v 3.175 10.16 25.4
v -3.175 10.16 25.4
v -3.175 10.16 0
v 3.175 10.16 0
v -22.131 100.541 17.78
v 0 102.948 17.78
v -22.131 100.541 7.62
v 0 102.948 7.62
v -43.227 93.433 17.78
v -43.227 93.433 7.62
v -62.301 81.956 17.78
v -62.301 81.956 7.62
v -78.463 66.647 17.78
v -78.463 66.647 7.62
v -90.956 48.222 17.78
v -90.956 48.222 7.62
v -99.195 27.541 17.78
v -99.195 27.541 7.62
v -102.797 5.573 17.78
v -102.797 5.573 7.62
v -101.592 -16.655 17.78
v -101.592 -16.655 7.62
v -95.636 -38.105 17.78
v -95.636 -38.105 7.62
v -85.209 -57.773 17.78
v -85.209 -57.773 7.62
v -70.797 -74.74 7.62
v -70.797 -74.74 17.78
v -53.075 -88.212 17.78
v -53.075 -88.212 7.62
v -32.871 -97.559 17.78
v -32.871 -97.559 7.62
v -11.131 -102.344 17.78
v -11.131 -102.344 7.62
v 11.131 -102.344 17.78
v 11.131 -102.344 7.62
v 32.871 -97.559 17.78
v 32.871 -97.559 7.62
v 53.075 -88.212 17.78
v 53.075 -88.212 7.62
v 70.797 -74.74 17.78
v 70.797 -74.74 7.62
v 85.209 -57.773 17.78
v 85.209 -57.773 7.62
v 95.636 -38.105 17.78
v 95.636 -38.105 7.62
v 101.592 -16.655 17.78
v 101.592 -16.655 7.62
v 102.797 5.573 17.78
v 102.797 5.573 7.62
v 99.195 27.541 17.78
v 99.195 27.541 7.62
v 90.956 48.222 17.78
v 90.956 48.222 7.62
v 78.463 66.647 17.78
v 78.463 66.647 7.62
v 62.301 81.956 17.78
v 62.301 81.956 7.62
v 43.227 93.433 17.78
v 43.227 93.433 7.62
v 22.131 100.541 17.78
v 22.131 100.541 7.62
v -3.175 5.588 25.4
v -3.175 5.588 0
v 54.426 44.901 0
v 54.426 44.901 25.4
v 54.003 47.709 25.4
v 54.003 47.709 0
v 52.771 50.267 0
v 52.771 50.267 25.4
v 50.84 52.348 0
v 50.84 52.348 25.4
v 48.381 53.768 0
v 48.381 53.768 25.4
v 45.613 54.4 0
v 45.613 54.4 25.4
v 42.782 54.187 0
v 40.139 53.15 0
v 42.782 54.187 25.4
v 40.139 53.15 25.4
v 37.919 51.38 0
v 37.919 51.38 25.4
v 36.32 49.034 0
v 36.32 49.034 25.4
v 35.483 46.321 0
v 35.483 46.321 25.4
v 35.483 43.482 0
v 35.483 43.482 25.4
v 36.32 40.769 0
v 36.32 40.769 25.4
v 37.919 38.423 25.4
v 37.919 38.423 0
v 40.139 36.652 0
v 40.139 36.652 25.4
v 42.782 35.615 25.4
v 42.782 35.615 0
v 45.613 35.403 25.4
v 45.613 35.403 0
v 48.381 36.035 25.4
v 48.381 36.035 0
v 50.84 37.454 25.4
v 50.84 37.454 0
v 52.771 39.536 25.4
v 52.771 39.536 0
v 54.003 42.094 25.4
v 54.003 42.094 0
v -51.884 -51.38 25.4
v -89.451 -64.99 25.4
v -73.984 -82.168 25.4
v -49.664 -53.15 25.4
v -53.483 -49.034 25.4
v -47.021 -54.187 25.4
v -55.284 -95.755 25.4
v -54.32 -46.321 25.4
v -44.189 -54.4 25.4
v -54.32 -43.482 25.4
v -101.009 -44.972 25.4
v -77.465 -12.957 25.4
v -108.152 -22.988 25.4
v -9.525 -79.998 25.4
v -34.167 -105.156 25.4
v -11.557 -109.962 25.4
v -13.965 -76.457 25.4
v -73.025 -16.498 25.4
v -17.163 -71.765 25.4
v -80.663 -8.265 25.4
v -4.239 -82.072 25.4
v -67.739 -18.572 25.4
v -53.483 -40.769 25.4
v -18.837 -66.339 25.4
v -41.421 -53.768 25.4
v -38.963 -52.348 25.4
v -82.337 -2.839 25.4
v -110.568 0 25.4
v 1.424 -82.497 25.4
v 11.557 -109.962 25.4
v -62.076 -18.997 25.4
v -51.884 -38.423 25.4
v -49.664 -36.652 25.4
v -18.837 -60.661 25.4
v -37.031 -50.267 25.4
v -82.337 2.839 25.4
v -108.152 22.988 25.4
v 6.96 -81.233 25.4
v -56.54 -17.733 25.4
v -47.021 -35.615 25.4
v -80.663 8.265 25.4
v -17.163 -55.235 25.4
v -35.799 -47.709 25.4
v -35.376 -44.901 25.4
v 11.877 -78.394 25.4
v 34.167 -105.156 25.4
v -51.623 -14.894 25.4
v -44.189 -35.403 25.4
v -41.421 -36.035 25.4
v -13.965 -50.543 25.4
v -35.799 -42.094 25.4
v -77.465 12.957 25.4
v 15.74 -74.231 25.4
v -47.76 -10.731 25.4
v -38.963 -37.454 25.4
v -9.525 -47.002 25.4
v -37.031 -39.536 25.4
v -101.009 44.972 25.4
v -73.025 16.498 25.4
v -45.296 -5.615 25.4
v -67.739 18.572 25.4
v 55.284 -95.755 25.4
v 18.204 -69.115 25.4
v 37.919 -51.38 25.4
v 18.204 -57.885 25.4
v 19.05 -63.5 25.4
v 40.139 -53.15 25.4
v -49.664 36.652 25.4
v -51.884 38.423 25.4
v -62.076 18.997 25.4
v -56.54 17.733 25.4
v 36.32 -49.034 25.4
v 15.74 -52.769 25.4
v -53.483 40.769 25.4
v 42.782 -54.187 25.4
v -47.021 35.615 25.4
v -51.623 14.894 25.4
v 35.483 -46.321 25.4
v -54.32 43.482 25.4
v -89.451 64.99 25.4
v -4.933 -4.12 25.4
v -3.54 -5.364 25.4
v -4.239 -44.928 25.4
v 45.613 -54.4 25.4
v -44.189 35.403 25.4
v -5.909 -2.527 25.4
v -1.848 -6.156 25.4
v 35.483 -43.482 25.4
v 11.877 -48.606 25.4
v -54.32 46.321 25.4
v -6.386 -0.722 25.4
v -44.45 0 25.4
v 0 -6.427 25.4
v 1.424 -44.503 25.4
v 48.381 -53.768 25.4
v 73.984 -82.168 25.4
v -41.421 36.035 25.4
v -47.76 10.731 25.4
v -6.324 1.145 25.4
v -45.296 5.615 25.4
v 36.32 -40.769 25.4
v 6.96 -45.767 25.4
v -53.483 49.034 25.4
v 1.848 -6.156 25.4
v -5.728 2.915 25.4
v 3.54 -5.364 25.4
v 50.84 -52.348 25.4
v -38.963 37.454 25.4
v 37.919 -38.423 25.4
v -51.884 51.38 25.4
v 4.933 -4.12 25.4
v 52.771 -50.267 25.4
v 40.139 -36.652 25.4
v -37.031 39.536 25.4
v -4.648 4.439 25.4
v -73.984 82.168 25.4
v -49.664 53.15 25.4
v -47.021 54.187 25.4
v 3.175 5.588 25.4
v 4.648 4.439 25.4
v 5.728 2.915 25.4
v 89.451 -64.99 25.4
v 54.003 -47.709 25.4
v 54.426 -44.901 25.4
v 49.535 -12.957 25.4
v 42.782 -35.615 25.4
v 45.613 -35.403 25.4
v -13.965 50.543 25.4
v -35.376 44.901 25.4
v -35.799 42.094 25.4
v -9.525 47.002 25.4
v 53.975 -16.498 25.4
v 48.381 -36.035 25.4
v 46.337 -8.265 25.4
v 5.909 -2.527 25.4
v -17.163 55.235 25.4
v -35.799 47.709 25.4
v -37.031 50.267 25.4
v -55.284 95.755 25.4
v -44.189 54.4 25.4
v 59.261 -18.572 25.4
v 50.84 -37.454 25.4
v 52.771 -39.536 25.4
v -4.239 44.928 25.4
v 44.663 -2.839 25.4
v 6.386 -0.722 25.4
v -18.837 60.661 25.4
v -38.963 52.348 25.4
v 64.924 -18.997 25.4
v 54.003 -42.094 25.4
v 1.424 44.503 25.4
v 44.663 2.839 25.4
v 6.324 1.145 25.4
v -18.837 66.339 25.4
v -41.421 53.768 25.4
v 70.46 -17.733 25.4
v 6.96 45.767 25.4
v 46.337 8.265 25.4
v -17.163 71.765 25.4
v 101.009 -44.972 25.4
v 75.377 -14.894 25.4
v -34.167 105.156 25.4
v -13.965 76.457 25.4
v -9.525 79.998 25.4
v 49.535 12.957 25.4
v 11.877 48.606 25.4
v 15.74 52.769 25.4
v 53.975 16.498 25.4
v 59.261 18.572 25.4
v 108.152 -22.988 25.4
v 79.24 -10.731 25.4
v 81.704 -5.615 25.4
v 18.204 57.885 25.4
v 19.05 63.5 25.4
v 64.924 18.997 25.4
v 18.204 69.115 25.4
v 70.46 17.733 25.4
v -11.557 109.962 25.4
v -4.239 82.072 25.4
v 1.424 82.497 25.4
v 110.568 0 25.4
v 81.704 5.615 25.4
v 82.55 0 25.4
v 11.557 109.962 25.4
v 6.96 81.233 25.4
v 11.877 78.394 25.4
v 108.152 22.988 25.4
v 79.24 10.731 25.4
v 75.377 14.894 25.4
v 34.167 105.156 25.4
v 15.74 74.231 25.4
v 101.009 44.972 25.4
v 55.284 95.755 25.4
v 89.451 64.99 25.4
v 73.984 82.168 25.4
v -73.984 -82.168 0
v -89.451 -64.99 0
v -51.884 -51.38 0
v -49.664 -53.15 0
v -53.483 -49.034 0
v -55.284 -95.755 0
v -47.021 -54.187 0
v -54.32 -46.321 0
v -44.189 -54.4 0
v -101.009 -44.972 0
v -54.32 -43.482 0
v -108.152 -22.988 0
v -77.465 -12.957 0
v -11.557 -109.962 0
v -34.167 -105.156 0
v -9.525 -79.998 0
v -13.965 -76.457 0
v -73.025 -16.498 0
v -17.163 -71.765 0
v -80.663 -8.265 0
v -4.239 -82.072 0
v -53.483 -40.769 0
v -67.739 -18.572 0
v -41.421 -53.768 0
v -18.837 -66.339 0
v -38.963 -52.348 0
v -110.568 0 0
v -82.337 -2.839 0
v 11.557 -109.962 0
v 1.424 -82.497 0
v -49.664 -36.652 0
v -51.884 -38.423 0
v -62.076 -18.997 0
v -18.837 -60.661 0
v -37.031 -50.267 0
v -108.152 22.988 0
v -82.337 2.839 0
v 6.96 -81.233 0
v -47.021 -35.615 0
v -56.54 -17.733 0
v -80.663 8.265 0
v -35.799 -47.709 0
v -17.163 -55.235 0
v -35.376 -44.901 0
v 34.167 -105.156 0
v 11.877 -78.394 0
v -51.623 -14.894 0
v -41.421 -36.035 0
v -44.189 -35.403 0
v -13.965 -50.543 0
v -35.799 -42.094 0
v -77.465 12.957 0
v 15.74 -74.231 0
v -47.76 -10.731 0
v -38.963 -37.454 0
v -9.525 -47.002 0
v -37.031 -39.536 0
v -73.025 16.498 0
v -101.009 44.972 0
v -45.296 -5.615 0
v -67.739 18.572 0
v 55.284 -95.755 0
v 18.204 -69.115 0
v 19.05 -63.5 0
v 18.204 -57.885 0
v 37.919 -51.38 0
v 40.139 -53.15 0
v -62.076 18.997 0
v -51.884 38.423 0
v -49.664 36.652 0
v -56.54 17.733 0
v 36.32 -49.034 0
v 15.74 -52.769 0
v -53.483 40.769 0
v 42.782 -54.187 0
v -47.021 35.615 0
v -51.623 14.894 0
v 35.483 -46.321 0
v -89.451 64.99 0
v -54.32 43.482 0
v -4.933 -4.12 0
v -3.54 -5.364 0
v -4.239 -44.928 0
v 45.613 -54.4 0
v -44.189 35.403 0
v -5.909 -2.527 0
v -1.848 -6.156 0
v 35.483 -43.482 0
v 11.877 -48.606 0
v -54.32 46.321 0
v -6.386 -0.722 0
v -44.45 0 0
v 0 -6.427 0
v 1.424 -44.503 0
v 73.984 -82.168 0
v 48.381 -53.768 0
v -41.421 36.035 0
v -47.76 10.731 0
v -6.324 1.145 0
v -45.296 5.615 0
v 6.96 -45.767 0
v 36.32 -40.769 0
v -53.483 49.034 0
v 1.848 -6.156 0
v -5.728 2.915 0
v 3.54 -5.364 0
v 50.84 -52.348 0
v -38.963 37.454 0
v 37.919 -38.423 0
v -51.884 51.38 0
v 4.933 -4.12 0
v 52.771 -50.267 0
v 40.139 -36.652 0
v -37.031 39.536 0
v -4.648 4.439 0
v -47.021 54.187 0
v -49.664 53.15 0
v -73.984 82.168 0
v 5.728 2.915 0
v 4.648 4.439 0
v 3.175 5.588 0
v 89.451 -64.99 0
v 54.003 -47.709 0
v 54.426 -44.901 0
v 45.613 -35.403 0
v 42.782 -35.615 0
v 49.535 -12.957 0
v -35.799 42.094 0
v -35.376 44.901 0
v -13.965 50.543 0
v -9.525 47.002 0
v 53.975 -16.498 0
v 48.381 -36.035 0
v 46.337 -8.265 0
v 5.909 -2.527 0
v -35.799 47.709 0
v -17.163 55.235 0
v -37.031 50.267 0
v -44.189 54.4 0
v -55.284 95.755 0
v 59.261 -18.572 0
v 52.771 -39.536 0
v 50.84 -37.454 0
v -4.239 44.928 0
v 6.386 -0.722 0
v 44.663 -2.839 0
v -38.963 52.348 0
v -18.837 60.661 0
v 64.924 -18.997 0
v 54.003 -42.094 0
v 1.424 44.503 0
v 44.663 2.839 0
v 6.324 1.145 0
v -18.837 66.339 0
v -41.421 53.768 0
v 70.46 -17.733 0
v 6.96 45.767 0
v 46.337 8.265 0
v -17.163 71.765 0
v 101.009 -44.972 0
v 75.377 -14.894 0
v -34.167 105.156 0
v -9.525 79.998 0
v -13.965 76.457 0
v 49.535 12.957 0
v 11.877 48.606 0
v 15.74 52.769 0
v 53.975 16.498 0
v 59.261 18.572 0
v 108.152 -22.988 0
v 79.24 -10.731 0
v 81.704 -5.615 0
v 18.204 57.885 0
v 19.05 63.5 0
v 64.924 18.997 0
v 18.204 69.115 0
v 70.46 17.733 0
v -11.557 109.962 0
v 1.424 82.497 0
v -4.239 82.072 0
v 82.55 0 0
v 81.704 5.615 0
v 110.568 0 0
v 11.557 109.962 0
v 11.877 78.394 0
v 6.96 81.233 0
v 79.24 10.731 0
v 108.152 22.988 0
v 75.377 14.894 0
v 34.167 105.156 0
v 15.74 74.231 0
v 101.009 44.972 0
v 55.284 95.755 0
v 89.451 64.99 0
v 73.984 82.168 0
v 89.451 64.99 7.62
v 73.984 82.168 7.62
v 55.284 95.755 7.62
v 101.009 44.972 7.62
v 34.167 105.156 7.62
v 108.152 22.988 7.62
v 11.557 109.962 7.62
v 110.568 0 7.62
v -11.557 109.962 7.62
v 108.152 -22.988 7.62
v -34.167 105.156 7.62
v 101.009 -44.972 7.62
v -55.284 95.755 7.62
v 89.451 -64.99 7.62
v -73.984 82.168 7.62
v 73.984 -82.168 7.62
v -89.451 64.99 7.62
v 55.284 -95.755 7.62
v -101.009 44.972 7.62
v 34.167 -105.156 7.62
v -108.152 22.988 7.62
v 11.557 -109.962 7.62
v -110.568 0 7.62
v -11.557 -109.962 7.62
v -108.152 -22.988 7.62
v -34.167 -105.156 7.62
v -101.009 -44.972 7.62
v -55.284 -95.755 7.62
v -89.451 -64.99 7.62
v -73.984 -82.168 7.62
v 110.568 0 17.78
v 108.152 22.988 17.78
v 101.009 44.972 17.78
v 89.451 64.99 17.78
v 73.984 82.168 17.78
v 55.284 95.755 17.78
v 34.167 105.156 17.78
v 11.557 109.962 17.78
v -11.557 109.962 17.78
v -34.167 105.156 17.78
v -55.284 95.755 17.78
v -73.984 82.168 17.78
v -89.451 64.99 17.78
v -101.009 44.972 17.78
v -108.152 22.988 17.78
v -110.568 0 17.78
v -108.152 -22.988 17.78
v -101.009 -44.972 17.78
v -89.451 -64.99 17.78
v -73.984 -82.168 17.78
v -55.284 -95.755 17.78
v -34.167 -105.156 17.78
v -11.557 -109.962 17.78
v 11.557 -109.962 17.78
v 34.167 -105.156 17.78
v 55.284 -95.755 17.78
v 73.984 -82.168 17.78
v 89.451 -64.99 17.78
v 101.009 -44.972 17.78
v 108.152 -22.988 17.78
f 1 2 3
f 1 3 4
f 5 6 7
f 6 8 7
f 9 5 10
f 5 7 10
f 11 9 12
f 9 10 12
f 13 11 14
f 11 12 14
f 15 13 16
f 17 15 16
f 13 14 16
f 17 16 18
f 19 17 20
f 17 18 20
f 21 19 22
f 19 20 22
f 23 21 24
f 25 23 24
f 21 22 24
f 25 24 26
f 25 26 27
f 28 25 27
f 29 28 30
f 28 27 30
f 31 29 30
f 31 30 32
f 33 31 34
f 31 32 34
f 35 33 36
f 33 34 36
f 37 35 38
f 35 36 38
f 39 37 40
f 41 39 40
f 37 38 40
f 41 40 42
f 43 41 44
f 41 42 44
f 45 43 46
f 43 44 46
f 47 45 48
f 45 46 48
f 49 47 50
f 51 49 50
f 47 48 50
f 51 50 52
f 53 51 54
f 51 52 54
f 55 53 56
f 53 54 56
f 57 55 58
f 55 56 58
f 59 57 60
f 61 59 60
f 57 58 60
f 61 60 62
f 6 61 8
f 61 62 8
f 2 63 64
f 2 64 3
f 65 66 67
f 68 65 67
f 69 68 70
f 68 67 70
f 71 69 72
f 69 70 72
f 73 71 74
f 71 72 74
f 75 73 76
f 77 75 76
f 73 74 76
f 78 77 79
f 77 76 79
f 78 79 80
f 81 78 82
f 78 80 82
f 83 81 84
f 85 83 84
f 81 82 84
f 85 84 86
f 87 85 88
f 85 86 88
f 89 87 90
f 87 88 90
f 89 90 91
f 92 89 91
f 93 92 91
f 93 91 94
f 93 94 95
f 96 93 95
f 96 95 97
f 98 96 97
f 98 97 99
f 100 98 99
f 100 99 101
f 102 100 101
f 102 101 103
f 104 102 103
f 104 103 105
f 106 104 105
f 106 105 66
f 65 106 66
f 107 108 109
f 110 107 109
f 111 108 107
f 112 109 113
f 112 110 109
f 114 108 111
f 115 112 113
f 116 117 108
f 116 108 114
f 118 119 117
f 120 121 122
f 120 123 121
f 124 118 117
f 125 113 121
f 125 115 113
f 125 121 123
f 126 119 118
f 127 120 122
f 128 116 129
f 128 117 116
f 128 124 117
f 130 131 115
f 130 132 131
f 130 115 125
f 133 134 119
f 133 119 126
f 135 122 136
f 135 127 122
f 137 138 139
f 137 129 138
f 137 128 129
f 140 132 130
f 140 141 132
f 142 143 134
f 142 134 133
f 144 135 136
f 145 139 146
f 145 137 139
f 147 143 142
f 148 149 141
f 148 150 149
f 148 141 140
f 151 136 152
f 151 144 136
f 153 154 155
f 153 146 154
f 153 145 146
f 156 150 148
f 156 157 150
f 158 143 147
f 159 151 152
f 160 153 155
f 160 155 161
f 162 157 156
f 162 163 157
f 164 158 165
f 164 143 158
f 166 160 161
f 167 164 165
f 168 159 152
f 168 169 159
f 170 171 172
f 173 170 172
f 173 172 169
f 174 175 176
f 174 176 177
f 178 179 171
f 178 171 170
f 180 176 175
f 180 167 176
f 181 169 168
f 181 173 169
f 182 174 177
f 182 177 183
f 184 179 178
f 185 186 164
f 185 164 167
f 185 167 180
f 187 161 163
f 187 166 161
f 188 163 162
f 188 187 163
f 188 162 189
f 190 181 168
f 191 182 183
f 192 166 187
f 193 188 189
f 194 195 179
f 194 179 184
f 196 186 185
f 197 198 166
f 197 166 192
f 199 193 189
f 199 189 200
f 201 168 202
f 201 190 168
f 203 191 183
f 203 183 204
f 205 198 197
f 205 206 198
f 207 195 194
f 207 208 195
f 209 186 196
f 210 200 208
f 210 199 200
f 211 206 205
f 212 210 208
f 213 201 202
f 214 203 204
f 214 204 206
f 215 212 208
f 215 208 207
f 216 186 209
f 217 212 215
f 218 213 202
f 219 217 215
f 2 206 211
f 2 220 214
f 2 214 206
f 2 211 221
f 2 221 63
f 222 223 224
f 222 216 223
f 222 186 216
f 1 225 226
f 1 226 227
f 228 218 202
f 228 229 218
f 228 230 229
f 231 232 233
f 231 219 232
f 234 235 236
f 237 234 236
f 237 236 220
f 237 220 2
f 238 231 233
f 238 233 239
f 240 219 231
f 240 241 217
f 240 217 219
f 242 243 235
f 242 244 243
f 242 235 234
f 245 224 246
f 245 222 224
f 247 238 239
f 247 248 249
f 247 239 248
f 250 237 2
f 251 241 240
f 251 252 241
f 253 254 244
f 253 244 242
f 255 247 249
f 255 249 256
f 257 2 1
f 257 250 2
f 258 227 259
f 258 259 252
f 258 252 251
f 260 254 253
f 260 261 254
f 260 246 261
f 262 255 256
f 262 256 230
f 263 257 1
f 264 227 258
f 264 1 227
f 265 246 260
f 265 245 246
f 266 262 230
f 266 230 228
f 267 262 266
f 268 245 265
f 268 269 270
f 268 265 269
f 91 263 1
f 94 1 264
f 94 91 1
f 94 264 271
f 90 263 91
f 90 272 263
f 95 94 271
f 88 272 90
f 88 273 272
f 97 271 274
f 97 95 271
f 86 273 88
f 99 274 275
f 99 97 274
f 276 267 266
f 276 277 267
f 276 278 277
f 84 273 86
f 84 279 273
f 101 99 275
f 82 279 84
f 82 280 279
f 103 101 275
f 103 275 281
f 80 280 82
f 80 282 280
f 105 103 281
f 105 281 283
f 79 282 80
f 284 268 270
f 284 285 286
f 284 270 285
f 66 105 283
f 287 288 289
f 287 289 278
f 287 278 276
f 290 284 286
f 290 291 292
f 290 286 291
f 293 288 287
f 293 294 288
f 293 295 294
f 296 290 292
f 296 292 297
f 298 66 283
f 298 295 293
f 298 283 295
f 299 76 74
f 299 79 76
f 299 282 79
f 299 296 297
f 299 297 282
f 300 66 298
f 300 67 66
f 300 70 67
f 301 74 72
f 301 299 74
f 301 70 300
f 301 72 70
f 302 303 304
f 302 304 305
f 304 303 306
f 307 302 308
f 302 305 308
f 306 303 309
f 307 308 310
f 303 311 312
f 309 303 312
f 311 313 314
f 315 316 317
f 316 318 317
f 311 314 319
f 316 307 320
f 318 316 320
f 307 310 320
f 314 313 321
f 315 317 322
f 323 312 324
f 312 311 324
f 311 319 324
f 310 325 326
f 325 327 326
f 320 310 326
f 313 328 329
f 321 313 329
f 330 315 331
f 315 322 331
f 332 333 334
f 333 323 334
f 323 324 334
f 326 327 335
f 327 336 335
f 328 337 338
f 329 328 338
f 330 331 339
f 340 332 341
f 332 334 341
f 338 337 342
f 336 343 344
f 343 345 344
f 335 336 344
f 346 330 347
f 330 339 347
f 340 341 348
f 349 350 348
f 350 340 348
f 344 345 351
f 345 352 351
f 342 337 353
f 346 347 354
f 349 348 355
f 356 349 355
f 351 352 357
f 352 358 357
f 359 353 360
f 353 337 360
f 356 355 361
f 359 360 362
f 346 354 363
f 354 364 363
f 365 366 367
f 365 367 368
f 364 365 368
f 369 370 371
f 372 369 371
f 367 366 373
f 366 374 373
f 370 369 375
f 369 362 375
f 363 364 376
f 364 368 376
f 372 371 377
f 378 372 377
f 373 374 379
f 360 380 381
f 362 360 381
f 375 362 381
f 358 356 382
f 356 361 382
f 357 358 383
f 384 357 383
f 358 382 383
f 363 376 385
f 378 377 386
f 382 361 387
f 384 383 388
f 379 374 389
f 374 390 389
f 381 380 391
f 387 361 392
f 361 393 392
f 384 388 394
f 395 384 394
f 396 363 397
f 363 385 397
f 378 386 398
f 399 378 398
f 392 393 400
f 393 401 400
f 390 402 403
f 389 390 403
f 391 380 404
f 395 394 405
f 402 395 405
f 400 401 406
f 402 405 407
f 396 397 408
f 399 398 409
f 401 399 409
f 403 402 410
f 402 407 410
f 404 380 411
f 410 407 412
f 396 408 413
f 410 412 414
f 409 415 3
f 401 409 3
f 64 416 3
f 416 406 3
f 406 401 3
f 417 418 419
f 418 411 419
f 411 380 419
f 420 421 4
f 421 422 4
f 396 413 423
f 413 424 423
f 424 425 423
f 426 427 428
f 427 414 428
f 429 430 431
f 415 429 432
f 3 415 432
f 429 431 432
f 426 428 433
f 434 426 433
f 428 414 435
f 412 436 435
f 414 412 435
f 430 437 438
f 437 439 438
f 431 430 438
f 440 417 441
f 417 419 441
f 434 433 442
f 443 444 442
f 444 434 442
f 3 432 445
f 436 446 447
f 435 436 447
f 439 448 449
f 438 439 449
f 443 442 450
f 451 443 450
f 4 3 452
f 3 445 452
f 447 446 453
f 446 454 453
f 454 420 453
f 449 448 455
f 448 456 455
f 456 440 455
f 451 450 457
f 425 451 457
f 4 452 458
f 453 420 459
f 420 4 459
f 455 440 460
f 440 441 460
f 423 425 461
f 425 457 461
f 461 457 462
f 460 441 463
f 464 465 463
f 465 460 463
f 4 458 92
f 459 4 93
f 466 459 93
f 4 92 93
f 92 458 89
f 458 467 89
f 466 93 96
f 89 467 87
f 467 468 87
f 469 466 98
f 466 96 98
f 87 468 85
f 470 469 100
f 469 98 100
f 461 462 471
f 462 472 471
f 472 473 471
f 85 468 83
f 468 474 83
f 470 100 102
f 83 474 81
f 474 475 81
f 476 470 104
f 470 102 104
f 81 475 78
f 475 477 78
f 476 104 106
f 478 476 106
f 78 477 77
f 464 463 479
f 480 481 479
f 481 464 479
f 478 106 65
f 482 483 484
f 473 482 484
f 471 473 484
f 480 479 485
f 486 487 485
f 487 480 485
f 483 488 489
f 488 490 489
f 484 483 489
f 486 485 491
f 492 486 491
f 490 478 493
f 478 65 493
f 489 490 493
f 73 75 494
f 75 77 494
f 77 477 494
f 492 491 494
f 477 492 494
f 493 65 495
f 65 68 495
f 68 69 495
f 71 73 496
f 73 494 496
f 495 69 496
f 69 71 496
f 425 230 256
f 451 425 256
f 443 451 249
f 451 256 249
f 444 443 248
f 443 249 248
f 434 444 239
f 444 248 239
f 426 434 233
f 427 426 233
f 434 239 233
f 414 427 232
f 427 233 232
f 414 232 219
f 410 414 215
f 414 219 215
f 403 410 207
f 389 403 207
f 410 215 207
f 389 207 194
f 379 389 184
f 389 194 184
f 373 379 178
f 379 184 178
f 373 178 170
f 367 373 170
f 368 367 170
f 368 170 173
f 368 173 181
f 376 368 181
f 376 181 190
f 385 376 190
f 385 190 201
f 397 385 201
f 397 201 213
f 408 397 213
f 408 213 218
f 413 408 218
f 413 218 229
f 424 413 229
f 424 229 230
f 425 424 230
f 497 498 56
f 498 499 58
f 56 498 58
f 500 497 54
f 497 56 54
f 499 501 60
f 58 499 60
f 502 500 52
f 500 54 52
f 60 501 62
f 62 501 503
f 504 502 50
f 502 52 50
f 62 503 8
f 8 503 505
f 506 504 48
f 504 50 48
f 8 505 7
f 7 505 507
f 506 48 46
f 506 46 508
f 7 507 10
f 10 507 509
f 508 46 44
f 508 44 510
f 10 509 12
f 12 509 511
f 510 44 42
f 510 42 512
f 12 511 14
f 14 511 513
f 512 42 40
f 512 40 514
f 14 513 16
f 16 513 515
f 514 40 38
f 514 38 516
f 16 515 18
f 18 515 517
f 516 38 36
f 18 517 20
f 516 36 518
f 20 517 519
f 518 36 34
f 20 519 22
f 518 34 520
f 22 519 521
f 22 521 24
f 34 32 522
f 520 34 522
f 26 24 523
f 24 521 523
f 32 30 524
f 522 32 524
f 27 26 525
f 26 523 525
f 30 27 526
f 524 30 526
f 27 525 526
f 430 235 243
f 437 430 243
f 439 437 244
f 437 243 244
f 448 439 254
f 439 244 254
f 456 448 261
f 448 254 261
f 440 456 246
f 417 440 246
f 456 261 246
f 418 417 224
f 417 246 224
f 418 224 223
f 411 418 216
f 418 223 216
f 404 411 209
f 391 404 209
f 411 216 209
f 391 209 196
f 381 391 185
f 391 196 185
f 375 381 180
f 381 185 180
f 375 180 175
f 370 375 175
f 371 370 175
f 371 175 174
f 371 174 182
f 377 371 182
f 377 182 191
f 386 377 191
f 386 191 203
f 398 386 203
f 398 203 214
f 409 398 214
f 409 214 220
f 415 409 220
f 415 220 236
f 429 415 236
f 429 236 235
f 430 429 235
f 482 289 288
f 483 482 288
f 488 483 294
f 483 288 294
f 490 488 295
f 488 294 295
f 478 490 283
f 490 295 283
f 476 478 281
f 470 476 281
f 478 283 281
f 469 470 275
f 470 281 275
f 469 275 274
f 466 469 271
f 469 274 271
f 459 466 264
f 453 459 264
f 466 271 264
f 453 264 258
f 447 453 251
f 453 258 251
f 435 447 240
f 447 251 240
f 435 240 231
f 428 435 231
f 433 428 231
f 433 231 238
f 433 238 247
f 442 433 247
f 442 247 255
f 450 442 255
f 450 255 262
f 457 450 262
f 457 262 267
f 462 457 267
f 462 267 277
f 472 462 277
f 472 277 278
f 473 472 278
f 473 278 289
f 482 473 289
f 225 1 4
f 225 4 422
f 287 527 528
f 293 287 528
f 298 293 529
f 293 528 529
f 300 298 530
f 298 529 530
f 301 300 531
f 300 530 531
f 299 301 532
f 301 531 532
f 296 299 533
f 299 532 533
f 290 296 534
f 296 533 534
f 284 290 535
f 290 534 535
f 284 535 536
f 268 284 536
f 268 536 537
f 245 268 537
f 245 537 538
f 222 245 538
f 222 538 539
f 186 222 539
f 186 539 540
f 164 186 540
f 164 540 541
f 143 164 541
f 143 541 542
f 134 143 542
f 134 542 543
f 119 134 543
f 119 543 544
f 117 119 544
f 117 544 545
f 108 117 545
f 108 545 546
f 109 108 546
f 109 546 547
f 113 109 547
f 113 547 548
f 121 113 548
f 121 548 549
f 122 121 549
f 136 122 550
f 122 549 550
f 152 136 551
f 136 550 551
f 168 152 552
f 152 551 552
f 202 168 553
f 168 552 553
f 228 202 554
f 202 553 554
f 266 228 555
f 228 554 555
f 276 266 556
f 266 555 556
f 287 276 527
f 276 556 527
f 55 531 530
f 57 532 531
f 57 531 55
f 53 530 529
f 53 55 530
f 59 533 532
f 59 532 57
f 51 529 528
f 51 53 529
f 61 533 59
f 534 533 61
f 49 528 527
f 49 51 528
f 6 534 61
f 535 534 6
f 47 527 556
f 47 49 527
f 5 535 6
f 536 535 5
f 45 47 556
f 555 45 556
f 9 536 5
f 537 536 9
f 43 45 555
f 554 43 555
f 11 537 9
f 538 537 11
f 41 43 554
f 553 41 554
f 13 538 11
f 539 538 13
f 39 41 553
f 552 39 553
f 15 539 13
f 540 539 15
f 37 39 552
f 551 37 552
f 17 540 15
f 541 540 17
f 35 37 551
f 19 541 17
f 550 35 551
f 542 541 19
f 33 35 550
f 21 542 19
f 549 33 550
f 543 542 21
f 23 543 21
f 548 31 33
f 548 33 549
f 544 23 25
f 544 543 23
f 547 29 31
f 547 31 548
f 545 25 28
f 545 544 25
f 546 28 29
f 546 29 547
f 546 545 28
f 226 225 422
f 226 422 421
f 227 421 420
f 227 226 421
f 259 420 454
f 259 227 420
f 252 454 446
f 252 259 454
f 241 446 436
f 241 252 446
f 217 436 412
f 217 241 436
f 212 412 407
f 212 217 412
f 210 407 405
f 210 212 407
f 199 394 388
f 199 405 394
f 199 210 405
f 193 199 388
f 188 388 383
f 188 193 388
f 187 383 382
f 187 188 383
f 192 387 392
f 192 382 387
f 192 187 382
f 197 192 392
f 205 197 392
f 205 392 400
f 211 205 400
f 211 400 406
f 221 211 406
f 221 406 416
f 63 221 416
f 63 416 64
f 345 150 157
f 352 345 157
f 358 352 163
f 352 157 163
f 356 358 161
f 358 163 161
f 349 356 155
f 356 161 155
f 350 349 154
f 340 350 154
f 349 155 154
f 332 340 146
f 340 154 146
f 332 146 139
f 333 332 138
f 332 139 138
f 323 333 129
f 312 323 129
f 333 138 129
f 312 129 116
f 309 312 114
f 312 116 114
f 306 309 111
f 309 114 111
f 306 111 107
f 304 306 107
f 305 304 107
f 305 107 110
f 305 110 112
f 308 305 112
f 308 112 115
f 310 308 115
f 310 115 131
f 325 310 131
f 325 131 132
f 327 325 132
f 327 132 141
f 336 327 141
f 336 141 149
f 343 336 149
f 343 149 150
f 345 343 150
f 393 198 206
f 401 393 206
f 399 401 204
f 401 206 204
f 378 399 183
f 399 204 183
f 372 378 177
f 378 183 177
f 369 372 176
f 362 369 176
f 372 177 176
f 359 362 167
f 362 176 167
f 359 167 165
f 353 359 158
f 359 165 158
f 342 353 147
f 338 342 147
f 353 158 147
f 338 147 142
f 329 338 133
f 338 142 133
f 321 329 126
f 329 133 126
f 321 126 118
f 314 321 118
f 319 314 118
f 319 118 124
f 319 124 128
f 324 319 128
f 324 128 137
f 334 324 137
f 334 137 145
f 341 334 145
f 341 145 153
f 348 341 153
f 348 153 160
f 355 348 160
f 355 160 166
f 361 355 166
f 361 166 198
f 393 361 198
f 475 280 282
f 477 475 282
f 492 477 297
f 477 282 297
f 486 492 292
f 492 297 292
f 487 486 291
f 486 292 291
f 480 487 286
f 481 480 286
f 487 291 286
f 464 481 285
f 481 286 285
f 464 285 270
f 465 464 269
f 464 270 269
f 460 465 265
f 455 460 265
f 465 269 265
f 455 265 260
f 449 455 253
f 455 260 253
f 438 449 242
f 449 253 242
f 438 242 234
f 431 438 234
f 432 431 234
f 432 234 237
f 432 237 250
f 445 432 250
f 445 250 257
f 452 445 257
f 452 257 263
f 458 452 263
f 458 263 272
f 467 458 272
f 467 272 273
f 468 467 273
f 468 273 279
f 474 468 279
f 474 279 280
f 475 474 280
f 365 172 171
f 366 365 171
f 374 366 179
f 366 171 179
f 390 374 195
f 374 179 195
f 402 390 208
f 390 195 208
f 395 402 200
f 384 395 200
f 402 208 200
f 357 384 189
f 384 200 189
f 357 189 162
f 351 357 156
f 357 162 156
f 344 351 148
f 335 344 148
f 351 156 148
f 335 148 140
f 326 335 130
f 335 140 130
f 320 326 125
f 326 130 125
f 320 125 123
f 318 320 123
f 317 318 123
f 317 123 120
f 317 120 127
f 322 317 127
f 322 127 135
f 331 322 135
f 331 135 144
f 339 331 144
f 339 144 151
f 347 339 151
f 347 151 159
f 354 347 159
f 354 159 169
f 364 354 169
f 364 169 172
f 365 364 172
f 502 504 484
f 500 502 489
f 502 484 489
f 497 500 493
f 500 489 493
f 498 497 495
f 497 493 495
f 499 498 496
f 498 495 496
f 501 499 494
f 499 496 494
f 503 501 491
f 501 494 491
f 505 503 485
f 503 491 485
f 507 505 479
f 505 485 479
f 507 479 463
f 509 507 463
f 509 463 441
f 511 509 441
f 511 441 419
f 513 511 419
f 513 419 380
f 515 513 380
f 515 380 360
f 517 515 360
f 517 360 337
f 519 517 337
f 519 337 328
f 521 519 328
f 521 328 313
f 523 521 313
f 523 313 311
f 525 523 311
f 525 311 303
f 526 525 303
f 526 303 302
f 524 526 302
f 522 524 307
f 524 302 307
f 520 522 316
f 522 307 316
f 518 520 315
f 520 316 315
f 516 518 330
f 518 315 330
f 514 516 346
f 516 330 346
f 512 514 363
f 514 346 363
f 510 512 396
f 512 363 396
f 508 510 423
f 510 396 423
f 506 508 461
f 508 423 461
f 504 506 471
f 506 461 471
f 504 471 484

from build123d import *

# Parameters (mm, degrees)
SKETCH1_R           = 110.567781149
BOSS_EXTRUDE1_DEPTH = 25.4
SKETCH2_R           = 19.05
SKETCH2_R_2         = 9.525
CUT_EXTRUDE3_DEPTH  = 140.716
CUT_EXTRUDE4_DEPTH  = 134.112
SKETCH6_W           = 10.16
SKETCH6_H           = 7.62


with BuildPart() as part:
    # Sketch1 → Boss-Extrude1 (new body)
    with BuildSketch(Plane.XY):
        Circle(SKETCH1_R)
    extrude(amount=BOSS_EXTRUDE1_DEPTH)

    # Sketch2 → Cut-Extrude3 (cut)
    with BuildSketch(Plane.XY.offset(25.4)):
        with Locations((0, 63.5)):
            Circle(SKETCH2_R)
        with Locations((63.5, 0)):
            Circle(SKETCH2_R)
        with Locations((44.901280605, -44.901280605)):
            Circle(SKETCH2_R_2)
        with Locations((0, -63.5)):
            Circle(SKETCH2_R)
        with Locations((44.901280605, 44.901280605)):
            Circle(SKETCH2_R_2)
        with Locations((-44.901280605, -44.901280605)):
            Circle(SKETCH2_R_2)
        with Locations((-63.5, 0)):
            Circle(SKETCH2_R)
        with Locations((-44.901280605, 44.901280605)):
            Circle(SKETCH2_R_2)
    extrude(amount=-CUT_EXTRUDE3_DEPTH, mode=Mode.SUBTRACT)

    # Sketch5 → Cut-Extrude4 (cut)
    with BuildSketch(Plane.XY.offset(25.4)):
        with BuildLine():
            Line((-3.175, 10.16), (3.175, 10.16))
            Line((3.175, 10.16), (3.175, 5.588))
            ThreePointArc((3.175, 5.588), (0, -6.427003112), (-3.175, 5.588))
            Line((-3.175, 5.588), (-3.175, 10.16))
        make_face()
    extrude(amount=-CUT_EXTRUDE4_DEPTH, mode=Mode.SUBTRACT)

    # Sketch6 → Cut-Revolve1 (revolve, cut)
    with BuildSketch(Plane(origin=(0, 0, 0), x_dir=(0, 0, -1), z_dir=(1, 0, 0))):
        with Locations((-12.7, 106.757781149)):
            Rectangle(SKETCH6_W, SKETCH6_H)
    revolve(axis=Axis((0, 0, 0), (0, 0, 1)), mode=Mode.SUBTRACT)


solid = part.part
